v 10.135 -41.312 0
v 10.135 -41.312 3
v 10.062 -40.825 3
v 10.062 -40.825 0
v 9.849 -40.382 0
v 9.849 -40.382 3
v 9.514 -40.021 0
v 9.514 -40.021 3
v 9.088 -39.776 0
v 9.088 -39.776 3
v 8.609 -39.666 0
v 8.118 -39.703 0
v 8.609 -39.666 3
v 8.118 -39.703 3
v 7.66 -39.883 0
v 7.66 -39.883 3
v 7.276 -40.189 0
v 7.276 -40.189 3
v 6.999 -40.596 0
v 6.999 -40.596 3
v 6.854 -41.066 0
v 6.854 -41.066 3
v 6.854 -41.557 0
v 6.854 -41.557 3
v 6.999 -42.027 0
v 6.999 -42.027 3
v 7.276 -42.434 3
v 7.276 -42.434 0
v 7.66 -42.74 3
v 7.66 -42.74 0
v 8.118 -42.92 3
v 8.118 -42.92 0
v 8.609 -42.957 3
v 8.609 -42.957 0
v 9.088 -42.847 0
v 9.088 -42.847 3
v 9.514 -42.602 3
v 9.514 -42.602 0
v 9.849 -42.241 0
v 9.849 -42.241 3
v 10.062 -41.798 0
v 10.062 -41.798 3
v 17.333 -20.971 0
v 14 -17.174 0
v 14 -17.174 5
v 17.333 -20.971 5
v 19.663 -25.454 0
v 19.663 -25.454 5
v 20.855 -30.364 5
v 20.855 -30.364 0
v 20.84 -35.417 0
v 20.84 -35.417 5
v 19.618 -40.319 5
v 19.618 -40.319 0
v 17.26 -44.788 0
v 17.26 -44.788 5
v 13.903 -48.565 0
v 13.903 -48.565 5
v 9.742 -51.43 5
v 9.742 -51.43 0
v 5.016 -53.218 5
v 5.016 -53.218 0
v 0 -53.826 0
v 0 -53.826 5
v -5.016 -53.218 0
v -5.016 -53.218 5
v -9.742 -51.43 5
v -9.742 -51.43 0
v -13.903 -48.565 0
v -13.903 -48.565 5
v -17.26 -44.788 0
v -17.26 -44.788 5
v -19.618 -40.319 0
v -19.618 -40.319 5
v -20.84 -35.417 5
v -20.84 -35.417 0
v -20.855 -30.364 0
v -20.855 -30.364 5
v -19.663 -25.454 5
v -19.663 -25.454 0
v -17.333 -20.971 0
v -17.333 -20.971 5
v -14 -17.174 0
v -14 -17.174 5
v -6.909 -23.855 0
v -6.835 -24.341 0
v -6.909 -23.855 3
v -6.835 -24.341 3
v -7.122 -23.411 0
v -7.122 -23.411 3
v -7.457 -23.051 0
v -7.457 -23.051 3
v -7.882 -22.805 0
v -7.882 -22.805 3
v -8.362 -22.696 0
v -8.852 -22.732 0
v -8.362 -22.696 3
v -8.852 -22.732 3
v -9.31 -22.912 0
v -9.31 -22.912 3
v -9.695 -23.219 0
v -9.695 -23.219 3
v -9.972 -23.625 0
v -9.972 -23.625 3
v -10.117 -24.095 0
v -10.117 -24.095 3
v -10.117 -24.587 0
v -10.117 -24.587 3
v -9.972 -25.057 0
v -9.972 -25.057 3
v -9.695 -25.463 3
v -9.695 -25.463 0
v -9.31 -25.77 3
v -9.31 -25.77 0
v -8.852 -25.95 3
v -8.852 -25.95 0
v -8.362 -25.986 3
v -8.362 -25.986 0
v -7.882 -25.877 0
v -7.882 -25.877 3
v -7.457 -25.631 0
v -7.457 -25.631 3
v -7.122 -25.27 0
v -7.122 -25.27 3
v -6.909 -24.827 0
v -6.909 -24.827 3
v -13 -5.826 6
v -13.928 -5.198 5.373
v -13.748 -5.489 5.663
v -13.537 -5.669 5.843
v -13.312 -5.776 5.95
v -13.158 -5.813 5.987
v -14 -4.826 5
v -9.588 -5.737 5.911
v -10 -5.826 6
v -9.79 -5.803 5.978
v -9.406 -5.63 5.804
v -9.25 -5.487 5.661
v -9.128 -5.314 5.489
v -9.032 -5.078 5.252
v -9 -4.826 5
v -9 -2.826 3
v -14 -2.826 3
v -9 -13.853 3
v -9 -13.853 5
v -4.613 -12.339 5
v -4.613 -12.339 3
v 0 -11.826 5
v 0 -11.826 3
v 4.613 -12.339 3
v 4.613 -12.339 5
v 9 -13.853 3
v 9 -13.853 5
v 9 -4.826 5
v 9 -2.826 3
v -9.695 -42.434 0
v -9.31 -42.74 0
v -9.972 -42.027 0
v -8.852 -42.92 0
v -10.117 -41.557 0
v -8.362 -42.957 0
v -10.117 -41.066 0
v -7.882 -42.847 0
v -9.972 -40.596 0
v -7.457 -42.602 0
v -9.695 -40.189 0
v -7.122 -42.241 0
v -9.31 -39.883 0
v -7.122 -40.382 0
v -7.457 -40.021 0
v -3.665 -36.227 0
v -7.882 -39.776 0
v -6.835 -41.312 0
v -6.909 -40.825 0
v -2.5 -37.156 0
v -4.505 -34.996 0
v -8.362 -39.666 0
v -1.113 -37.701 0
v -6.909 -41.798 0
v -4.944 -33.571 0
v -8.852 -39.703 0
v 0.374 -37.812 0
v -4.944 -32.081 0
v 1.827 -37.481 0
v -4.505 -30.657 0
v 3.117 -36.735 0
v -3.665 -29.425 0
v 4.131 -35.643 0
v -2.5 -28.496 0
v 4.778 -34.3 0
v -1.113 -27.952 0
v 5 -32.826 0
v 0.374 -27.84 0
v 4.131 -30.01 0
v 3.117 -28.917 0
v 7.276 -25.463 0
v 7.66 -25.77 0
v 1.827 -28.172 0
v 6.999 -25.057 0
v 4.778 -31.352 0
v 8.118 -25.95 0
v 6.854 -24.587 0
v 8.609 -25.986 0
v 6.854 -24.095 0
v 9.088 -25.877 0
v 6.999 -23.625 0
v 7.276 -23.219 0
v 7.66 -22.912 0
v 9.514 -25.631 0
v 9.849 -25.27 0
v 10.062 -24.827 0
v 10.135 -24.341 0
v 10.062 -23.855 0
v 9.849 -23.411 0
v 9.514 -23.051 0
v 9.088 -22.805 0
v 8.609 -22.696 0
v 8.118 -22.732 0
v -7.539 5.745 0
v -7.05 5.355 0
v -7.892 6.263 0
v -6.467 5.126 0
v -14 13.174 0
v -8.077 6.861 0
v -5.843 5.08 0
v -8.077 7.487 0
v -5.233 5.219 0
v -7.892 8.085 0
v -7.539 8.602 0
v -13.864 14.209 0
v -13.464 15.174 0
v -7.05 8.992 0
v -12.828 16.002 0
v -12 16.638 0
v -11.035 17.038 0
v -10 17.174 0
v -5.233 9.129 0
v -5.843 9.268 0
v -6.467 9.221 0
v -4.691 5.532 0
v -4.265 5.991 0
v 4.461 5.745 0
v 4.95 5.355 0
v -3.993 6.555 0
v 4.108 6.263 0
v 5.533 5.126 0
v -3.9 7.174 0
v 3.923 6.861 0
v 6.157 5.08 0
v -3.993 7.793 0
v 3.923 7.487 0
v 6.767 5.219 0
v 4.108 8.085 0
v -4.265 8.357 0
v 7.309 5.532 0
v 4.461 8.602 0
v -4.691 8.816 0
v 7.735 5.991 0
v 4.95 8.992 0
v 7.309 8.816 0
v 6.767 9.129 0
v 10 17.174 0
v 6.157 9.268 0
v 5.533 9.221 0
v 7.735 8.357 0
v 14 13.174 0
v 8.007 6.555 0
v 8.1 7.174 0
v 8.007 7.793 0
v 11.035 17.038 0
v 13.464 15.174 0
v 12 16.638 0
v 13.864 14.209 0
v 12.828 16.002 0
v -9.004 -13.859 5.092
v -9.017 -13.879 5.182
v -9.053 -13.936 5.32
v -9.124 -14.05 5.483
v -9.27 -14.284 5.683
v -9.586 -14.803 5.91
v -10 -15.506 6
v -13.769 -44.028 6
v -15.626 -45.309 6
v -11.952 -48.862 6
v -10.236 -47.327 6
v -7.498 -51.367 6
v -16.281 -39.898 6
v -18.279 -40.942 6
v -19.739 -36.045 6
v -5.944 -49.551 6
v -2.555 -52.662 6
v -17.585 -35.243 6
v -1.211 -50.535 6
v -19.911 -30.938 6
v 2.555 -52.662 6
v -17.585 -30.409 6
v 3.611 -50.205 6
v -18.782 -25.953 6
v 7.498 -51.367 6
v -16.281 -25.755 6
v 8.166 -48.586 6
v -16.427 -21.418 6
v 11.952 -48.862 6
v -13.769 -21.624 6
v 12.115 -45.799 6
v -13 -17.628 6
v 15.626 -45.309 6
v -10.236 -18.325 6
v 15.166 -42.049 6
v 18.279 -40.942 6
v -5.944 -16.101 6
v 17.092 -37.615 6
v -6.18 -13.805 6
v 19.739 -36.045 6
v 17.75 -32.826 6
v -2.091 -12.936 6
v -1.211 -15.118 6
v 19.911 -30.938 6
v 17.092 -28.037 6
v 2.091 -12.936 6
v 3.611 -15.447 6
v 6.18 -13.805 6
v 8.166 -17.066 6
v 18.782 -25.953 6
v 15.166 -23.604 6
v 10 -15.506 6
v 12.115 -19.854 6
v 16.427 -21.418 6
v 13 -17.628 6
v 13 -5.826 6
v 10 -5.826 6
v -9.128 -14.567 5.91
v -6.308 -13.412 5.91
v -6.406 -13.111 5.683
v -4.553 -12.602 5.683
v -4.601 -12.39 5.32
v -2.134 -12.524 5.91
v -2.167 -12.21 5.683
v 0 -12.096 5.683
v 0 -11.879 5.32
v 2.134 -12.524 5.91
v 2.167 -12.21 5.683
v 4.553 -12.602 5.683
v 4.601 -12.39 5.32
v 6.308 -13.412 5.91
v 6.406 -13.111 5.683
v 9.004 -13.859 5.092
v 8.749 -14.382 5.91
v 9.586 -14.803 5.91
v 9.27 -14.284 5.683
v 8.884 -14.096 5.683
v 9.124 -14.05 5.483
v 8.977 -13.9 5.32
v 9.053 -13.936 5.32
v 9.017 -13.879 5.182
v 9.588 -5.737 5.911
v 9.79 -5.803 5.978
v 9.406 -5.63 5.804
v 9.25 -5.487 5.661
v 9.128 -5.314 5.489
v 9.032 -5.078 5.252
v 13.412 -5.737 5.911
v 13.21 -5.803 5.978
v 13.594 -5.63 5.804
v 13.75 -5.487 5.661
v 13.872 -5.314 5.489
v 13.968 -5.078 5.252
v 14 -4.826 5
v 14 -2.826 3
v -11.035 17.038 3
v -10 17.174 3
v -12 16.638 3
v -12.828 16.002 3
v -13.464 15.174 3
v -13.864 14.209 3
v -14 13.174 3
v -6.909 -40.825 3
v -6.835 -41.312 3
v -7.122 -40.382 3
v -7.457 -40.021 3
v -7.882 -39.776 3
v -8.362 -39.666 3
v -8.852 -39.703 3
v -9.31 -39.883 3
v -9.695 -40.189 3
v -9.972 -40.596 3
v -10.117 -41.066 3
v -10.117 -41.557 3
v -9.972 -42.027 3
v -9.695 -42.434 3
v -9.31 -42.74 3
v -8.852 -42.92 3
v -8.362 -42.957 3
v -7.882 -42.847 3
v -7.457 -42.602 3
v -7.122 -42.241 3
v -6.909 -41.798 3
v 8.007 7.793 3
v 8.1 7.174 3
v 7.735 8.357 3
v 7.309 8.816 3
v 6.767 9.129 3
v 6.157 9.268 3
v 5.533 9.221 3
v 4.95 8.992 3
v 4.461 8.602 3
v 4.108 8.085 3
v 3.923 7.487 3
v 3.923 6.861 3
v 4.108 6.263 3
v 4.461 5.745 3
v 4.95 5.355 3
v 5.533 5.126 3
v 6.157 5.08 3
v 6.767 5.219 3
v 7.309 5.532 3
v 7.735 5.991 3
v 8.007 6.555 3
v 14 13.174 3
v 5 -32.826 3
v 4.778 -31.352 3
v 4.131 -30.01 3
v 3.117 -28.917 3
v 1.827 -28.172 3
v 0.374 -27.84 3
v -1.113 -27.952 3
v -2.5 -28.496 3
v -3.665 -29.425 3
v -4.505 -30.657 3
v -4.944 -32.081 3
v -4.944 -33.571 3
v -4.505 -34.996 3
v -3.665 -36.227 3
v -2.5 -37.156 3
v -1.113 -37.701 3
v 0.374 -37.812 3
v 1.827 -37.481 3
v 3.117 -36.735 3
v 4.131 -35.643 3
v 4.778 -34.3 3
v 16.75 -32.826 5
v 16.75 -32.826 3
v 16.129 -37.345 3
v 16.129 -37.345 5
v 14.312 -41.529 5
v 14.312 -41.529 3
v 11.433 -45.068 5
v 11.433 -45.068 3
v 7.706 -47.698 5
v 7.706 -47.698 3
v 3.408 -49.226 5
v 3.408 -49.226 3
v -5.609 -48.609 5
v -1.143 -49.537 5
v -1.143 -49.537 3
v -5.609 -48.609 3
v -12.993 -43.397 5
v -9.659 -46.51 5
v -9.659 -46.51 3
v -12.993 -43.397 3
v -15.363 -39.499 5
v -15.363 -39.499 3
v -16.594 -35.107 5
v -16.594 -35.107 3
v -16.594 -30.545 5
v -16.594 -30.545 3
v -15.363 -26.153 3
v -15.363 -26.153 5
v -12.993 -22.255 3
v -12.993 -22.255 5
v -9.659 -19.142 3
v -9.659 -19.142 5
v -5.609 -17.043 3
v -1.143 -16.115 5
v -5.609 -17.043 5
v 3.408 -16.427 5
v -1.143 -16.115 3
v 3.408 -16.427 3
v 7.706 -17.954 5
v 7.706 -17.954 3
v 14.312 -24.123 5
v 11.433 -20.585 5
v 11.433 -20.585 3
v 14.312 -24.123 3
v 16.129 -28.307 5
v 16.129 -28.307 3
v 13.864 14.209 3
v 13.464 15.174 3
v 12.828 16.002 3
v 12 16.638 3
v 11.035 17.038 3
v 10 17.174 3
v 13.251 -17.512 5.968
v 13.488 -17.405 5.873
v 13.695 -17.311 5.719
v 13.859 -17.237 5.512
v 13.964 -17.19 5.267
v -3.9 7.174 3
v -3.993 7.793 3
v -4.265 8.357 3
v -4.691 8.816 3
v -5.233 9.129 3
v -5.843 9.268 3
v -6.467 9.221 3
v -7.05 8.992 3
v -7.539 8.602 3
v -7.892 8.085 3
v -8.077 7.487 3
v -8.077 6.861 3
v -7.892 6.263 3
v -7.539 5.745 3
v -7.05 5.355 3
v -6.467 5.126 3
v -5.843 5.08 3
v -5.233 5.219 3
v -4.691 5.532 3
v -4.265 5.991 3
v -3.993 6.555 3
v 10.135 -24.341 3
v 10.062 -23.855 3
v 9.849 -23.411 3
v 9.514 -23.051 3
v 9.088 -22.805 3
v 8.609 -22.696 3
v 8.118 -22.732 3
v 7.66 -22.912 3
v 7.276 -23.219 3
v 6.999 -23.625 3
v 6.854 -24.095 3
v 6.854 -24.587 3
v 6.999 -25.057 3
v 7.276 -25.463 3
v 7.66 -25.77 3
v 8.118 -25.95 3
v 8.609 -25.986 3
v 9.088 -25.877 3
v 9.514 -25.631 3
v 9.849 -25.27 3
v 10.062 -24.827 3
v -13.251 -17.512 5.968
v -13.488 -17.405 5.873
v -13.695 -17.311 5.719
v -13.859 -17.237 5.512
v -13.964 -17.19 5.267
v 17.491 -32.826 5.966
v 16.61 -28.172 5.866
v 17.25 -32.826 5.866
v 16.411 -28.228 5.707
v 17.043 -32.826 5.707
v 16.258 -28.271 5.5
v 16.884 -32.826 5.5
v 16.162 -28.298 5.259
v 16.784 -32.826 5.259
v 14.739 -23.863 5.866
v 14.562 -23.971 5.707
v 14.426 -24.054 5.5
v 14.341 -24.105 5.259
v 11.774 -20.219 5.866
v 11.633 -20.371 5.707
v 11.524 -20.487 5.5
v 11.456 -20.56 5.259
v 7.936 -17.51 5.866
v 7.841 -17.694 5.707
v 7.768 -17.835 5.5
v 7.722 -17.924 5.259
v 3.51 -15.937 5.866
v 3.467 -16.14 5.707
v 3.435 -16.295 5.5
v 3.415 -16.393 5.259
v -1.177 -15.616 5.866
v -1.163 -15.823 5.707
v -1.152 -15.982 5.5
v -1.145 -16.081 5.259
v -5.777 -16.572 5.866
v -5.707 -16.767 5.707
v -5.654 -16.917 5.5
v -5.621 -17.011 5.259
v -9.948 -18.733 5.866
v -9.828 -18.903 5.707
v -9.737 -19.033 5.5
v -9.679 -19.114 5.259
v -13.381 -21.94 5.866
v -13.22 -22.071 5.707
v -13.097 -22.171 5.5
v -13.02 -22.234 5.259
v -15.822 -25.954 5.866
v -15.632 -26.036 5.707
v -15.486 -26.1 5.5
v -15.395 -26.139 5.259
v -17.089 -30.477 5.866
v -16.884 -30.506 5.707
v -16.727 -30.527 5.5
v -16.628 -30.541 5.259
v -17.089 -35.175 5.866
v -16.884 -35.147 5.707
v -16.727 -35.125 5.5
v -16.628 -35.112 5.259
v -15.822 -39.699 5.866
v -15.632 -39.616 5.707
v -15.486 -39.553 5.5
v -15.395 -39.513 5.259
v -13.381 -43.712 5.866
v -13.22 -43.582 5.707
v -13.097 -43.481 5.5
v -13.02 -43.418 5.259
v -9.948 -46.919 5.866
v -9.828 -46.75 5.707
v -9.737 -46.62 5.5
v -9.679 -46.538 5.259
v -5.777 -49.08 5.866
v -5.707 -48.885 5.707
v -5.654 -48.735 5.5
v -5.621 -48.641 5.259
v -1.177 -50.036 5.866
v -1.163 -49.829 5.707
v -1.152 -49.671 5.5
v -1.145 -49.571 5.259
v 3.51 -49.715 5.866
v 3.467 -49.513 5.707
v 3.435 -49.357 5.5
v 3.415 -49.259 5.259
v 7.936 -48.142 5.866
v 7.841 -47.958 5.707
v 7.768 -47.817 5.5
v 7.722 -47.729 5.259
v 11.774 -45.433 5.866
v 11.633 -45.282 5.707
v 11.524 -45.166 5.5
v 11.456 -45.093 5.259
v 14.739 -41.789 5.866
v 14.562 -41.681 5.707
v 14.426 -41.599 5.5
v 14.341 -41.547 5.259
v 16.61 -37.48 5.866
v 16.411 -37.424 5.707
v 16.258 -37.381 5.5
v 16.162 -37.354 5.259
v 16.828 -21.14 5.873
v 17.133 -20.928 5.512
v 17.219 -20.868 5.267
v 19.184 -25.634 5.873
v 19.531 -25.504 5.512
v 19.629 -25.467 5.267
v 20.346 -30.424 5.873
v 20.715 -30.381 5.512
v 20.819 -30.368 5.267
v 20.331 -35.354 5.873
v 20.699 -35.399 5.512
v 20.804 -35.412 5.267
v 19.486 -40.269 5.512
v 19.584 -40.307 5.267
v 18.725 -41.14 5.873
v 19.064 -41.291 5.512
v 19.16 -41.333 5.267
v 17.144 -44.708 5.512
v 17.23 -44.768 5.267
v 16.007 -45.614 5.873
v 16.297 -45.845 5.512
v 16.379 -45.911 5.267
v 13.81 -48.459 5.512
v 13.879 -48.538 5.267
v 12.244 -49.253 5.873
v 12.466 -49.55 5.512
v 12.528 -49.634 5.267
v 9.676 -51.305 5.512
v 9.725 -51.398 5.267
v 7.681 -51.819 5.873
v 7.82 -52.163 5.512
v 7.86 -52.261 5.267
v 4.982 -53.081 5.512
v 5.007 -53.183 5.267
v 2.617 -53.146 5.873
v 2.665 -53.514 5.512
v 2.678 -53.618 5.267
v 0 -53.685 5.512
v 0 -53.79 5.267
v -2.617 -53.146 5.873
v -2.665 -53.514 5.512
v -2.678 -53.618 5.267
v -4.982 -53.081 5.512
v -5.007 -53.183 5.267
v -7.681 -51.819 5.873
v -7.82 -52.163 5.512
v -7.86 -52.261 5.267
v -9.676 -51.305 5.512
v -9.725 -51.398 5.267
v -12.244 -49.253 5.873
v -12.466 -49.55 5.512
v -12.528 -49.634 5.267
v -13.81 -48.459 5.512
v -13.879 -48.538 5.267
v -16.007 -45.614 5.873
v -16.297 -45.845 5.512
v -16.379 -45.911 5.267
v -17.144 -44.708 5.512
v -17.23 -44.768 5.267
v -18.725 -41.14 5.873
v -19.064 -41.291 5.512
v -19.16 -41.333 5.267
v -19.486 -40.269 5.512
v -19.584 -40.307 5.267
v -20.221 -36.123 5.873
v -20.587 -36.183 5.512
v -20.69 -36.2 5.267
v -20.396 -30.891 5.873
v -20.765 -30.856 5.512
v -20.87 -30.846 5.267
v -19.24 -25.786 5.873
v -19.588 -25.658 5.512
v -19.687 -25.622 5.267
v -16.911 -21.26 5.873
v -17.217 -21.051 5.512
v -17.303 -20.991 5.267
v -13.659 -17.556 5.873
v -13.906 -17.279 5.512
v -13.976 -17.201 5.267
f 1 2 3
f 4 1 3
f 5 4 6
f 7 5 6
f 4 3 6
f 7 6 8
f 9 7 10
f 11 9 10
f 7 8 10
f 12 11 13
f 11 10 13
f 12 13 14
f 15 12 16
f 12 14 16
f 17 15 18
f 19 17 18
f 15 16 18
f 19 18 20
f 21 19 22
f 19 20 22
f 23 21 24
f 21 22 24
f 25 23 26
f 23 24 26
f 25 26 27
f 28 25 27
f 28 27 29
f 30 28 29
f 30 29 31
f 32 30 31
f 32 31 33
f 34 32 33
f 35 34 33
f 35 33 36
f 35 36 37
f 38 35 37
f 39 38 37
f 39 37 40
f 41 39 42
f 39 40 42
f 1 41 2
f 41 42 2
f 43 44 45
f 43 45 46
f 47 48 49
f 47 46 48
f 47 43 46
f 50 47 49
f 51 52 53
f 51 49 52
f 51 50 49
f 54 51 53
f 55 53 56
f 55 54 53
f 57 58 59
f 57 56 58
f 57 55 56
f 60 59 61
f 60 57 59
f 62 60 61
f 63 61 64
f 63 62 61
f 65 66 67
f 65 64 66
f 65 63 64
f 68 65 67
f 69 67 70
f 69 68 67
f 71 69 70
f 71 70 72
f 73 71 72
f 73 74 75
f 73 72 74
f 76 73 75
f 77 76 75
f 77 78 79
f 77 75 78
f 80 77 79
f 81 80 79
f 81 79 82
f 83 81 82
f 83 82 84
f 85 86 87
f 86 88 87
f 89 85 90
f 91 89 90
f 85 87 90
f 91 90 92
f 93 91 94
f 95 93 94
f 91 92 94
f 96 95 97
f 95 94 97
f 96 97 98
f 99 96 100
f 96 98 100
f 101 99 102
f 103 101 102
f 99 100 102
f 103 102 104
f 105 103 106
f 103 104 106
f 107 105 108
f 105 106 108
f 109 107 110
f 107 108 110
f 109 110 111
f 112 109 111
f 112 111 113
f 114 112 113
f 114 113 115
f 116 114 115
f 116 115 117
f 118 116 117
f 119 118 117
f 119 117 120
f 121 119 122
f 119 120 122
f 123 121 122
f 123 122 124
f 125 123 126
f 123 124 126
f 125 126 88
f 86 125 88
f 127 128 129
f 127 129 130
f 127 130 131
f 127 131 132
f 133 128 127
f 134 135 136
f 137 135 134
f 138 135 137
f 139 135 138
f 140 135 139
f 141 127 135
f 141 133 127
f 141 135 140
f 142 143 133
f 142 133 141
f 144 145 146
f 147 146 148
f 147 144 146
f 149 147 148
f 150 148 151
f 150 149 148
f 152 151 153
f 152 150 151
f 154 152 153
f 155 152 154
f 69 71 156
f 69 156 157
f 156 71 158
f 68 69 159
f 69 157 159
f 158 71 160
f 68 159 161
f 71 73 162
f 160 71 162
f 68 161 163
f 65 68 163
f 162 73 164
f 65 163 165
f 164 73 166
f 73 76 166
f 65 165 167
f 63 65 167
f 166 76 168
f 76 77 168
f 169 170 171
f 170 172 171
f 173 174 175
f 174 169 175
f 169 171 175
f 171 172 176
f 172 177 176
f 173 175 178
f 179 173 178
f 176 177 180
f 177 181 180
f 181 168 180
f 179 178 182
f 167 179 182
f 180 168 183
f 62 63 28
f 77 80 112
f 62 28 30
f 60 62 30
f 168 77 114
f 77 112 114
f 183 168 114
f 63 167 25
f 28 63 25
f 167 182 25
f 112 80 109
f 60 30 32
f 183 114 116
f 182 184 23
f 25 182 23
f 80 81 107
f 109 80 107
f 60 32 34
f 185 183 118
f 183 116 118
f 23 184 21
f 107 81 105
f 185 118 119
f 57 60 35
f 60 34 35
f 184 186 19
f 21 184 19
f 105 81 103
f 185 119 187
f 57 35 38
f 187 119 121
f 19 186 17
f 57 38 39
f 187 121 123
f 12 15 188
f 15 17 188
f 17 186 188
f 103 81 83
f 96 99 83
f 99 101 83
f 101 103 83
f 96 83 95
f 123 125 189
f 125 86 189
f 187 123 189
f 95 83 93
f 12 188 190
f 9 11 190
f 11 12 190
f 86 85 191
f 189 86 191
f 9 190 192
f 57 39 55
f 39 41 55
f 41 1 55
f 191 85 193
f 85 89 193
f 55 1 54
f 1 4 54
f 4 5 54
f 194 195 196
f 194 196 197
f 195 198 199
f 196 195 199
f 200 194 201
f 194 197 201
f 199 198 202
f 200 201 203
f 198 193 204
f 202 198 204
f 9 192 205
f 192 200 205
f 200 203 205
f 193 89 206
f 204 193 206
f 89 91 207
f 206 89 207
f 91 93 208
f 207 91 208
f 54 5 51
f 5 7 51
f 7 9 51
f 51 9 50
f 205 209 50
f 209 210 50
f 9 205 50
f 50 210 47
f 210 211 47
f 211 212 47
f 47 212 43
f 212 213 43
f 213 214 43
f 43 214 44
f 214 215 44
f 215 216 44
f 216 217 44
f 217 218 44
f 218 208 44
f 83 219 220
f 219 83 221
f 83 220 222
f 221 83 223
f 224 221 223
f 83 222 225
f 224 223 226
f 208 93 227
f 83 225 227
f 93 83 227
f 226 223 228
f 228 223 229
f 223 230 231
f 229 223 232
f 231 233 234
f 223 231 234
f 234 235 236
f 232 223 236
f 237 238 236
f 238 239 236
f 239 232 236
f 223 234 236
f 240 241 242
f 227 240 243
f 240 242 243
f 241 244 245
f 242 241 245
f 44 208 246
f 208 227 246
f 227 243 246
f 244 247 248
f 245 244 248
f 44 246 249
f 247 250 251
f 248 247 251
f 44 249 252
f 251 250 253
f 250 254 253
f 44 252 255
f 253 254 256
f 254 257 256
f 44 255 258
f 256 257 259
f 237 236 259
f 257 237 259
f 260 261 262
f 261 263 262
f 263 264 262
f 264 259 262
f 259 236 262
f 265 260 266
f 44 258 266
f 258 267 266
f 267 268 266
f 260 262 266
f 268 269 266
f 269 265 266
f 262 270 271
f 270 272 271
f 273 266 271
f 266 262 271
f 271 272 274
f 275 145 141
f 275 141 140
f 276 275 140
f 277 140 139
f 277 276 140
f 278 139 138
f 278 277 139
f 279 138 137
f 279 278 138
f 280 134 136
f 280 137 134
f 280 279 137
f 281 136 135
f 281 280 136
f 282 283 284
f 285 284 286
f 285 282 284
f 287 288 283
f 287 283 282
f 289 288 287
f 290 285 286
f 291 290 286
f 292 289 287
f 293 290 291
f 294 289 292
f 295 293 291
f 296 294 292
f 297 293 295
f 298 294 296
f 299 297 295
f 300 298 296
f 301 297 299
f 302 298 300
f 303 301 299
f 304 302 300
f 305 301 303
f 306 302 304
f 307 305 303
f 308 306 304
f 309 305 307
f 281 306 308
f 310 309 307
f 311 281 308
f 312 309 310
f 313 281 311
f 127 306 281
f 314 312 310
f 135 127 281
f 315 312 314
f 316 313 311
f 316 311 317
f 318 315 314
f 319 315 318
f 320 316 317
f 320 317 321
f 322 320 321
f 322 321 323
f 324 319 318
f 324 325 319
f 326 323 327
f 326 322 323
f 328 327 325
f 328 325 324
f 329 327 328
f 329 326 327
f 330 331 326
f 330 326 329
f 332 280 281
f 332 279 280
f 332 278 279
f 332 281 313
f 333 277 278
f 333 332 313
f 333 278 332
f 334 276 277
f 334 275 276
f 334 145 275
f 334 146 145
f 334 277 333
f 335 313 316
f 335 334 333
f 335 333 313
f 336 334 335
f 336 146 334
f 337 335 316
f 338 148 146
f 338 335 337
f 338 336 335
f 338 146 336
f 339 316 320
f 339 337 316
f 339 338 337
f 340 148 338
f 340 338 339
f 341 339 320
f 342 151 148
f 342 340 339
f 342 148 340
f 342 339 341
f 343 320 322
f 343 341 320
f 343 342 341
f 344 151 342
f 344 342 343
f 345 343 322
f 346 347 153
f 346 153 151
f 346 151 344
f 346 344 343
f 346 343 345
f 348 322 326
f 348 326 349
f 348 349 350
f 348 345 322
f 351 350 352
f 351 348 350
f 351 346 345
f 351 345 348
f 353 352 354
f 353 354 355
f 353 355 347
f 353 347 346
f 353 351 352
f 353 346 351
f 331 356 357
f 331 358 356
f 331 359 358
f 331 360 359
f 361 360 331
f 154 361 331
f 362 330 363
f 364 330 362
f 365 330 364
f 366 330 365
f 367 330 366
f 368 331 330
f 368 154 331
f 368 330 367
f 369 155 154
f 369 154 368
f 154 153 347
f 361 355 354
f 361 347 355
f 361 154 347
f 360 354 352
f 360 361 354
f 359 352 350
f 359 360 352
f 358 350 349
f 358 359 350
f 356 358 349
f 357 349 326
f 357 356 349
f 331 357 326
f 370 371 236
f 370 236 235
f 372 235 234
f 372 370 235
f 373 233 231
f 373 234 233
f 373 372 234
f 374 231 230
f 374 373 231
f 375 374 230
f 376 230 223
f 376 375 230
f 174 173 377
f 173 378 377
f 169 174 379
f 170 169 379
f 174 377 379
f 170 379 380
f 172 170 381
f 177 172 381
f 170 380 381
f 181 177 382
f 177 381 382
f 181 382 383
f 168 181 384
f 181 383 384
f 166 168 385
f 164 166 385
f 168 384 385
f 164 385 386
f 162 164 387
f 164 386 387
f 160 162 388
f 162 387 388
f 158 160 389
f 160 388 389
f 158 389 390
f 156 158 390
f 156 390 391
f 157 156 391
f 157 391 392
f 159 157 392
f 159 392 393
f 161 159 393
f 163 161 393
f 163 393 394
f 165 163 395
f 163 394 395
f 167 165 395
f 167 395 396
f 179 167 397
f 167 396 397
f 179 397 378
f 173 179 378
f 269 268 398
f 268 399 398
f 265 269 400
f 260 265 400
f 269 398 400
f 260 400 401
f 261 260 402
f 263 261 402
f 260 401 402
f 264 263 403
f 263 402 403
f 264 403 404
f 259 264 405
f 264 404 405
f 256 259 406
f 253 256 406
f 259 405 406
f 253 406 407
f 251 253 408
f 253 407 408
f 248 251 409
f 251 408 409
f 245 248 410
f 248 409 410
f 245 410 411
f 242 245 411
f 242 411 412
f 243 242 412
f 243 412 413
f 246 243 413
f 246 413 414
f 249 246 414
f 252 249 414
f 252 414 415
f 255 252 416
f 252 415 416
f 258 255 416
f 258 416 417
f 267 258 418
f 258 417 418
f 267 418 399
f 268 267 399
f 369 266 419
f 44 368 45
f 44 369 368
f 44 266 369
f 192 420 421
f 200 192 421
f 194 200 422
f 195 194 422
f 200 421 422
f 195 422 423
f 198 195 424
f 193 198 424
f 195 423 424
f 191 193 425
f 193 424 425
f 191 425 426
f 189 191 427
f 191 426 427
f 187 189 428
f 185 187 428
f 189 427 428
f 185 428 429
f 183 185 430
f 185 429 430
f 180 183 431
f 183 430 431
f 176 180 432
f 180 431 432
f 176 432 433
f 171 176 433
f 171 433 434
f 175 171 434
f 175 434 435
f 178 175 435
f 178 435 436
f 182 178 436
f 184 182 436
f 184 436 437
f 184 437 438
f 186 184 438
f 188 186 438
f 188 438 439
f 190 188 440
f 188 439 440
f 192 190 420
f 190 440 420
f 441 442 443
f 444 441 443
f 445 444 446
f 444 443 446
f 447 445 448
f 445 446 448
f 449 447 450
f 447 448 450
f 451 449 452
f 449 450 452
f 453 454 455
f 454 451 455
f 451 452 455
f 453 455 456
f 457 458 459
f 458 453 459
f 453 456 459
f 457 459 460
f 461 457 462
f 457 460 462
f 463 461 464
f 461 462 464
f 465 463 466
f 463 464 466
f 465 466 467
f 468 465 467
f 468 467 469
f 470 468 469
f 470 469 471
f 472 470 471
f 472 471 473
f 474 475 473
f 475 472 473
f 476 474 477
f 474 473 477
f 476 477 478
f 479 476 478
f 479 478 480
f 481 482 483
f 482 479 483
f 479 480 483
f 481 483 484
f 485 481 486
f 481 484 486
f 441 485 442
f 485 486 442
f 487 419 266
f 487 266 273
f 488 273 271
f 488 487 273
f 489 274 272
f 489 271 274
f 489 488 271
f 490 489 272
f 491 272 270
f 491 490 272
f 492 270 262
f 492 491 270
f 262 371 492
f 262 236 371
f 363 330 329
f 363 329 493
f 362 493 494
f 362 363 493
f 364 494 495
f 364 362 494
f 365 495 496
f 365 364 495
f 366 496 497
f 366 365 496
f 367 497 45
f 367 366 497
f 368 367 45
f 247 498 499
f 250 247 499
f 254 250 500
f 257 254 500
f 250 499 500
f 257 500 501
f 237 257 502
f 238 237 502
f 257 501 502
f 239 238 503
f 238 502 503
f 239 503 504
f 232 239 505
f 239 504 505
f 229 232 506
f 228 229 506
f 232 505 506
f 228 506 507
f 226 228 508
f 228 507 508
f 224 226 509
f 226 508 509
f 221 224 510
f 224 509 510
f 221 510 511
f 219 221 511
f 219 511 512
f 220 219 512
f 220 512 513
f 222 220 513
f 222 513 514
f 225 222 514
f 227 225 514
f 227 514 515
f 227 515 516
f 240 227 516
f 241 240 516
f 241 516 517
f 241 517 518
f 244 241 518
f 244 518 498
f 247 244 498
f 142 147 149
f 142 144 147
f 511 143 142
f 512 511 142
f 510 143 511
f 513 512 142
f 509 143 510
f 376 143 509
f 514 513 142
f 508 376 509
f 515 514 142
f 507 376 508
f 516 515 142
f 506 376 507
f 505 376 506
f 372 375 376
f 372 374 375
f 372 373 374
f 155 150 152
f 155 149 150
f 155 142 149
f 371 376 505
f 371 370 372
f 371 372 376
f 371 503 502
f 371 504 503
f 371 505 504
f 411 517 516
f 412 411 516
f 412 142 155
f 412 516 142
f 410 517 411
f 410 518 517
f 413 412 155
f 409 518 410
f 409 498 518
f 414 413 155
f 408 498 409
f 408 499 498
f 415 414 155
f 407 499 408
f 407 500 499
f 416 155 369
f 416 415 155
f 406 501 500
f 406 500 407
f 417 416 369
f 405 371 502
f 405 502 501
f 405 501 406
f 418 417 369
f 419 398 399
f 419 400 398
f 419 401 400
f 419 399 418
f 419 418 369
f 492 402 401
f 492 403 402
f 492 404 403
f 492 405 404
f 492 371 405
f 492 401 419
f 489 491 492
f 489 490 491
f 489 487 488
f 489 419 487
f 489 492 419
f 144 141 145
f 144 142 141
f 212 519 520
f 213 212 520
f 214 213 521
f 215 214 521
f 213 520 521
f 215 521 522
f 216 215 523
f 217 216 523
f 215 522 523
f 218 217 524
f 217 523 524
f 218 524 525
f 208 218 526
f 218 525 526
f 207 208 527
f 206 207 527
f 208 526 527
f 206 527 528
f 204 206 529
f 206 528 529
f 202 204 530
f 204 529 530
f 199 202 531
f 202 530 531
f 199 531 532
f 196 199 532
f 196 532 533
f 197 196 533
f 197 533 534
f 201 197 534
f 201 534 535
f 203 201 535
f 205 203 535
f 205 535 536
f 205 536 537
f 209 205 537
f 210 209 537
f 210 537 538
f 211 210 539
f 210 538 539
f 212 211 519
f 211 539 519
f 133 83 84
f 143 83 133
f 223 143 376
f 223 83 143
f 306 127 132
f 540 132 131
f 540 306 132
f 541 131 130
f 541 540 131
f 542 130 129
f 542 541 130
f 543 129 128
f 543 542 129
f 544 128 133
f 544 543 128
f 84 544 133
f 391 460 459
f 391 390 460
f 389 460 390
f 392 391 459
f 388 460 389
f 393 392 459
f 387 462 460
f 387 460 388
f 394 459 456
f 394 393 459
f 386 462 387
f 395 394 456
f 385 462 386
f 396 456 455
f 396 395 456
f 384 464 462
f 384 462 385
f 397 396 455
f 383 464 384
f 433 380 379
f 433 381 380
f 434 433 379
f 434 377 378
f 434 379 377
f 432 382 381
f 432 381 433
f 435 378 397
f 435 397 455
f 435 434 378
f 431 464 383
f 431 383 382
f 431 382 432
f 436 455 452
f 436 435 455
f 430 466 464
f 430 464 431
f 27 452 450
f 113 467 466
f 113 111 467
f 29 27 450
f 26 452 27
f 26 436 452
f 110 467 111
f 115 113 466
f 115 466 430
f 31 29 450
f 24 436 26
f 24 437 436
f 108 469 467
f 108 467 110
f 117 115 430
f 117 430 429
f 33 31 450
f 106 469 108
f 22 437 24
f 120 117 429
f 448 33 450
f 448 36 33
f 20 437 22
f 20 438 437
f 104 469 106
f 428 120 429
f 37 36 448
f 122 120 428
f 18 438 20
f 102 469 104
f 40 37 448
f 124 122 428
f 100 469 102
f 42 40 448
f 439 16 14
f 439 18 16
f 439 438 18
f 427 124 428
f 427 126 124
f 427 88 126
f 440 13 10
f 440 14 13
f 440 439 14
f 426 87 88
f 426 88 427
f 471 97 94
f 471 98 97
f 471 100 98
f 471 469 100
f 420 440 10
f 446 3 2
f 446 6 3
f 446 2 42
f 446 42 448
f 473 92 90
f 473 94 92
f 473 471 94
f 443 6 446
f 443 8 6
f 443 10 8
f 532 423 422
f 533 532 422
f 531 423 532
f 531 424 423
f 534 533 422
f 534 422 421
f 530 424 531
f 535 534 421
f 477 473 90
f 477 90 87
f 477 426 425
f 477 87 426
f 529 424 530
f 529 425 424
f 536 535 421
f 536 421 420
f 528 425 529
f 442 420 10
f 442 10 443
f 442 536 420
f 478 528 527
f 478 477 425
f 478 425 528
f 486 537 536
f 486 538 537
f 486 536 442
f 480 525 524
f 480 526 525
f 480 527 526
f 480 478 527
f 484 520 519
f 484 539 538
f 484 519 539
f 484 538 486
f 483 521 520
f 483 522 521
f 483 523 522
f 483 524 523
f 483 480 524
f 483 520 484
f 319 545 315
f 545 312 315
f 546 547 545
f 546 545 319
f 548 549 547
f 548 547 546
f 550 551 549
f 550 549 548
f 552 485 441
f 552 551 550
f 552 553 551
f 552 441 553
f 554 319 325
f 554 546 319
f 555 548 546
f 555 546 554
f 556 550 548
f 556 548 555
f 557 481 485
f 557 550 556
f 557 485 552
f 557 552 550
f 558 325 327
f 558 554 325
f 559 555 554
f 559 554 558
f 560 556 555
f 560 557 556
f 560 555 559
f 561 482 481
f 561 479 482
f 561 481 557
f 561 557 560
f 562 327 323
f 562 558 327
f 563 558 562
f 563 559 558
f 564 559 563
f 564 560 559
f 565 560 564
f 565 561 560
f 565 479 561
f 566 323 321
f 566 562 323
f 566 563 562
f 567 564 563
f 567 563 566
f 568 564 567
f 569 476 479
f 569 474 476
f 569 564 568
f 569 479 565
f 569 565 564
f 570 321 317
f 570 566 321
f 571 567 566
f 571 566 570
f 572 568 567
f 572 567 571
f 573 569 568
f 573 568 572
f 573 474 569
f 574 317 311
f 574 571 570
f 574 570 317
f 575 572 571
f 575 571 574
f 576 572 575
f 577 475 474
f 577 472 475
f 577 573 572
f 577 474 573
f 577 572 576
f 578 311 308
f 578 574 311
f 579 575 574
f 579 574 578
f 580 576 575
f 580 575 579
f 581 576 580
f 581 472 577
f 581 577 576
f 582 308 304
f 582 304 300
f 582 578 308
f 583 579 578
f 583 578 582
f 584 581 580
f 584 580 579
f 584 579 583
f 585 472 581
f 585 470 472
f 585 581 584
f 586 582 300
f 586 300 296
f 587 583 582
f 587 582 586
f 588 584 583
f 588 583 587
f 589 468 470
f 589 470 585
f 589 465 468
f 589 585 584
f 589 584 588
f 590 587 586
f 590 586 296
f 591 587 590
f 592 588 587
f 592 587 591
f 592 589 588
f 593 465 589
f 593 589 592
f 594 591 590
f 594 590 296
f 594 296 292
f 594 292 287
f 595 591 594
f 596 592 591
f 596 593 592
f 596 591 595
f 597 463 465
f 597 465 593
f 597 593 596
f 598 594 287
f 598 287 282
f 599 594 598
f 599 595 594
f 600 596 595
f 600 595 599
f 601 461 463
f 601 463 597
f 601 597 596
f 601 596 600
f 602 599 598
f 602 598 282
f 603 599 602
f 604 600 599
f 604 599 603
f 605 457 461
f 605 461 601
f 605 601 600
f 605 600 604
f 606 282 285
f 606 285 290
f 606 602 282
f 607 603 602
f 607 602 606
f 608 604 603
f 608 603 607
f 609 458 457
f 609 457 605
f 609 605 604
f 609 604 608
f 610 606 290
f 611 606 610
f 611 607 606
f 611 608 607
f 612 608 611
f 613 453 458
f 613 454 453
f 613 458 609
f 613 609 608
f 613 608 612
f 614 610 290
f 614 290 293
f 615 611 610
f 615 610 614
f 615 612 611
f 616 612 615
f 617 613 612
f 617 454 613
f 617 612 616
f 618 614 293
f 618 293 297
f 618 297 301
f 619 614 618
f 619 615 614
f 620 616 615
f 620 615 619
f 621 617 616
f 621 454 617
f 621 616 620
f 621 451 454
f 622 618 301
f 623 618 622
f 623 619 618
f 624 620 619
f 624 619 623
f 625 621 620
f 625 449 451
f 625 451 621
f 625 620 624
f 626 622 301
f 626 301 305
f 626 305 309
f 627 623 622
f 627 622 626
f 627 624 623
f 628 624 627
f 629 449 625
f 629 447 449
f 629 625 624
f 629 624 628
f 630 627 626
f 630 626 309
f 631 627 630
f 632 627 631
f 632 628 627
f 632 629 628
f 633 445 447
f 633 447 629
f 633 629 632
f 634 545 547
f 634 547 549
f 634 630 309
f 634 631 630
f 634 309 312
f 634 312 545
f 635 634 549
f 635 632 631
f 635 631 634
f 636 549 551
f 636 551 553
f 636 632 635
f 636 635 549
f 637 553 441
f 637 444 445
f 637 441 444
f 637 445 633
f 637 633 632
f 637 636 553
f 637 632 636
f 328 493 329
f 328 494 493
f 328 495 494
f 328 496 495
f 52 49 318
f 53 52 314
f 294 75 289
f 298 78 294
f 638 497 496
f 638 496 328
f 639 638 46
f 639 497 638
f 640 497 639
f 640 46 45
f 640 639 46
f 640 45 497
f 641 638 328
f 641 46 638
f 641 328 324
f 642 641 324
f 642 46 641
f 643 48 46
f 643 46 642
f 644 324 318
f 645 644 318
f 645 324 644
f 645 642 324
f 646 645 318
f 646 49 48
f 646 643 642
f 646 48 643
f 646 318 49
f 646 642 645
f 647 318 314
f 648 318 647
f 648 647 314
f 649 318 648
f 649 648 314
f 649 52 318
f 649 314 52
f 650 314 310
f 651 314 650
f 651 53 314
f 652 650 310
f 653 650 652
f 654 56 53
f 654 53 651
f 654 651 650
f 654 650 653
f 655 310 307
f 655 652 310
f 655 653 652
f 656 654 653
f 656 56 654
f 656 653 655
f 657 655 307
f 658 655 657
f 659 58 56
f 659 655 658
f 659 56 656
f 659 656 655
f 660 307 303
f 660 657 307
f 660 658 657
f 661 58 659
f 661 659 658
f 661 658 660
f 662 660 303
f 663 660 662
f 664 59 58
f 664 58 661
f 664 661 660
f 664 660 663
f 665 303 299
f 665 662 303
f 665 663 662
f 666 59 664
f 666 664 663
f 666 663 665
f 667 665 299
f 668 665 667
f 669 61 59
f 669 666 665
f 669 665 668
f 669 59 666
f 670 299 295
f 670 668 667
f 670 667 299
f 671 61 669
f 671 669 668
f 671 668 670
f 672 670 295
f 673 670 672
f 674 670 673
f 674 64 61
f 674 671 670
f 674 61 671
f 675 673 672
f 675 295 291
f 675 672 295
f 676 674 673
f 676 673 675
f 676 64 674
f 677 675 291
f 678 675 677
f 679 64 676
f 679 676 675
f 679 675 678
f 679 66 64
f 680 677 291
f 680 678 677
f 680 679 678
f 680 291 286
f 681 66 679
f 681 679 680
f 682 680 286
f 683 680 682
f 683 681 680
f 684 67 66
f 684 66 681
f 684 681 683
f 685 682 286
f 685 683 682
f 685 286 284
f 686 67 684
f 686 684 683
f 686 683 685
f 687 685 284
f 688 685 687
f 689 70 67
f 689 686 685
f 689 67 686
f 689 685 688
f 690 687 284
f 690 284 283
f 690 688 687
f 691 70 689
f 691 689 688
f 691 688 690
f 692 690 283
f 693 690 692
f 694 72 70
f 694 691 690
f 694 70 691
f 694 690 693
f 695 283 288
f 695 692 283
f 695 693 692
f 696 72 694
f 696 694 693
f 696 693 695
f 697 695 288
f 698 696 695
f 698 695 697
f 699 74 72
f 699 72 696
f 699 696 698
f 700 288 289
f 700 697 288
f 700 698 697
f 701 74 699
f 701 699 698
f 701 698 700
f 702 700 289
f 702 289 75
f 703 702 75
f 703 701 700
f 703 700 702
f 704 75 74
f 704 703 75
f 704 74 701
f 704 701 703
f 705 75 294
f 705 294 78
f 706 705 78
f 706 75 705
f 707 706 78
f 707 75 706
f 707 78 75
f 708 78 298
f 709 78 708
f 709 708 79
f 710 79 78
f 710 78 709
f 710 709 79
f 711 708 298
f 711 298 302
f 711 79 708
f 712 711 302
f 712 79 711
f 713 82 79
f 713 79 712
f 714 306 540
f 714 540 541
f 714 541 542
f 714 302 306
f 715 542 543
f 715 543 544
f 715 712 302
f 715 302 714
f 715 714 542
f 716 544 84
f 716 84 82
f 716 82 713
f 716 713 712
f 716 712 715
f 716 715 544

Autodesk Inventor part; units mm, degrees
ref_plane "YZ Plane" through (0, 0, 0) normal (1, 0, 0) x (0, 1, 0)
ref_plane "XZ Plane" through (0, 0, 0) normal (0, 1, 0) x (-1, 0, 0)
ref_plane "XY Plane" through (0, 0, 0) normal (0, 0, 1) x (1, 0, 0)
sketch "Sketch1" plane through (0, 0, 0) normal (0, 0, 1) x (1, 0, 0)
  line L0 (-14, 17.1738) -> (14, 17.1738)
  line L1 (14, 17.1738) -> (14, -17.1738)
  line L2 (14, -32.8262) -> (-14, -32.8262)
  line L3 (-14, -32.8262) -> (-14, -17.1738)
  arc A0 (-14, -17.1738) -> (14, -17.1738) centre (0, -32.8262) ccw
  line L4 (-14, -17.1738) -> (-14, 17.1738)
  line L5 (14, -17.1738) -> (14, -32.8262)
  point P0 (0, 0)
  point P1 (0, 17.1738)
  point P2 (14, 0)
  dimension "d0" = 42
  dimension "d1" = 50
  dimension "d4" = 28
extrude "Extrusion1" add sketch "Sketch1" along normal blind 3
sketch "Sketch2" plane through (0, 0, 3) normal (0, 0, 1) x (1, 0, 0)
  line L0 (14, -17.1738) -> (14, 17.1738) projected
  line L1 (14, 17.1738) -> (-14, 17.1738) construction
  line L2 (-14, 17.1738) -> (-14, -17.1738) construction
  arc A0 (-14, -17.1738) -> (14, -17.1738) centre (0, -32.8262) ccw projected
  circle A1 centre (0, -32.8262) radius 16.75
  circle A2 centre (0, -32.8262) radius 21
  line L3 (-14, -2.8262) -> (14, -2.8262)
  line L4 (14, -17.1738) -> (14, 17.1738) construction
  line L5 (-14, 17.1738) -> (-14, -17.1738) projected
  line L6 (-14, -2.8262) -> (-14, -17.1738)
  line L7 (-9, -2.8262) -> (-9, -13.8526)
  line L8 (14, -2.8262) -> (14, -17.1738)
  line L9 (9, -13.8526) -> (9, -2.8262)
  arc A3 (-14, -17.1738) -> (14, -17.1738) centre (0, -32.8262) ccw projected
  line L10 (14, -2.8262) -> (14, -17.1738)
  point P0 (0, 0)
  dimension "d5" = 33.5
  dimension "d6" = 20
  dimension "d7" = 5
  dimension "d8" = 5
extrude "Extrusion2" add sketch "Sketch2" along normal blind 3 contours A2 L9 L3 L0 | A0 A2 | L5 L3 L7 A2
sketch "Sketch3" plane through (0, 0, 3) normal (0, 0, 1) x (1, 0, 0)
  circle A0 centre (0, -32.8262) radius 16.75 projected
  circle A1 centre (0, -32.8262) radius 5
  line L0 (9, -2.8262) -> (14, -2.8262) projected
  line L1 (14, -2.8262) -> (14, 17.1738) projected
  line L2 (14, 17.1738) -> (-14, 17.1738) projected
  line L3 (-14, 17.1738) -> (-14, -2.8262) projected
  line L4 (-14, -2.8262) -> (-9, -2.8262) projected
  line L5 (-9, -2.8262) -> (-9, -13.8526) projected
  arc A2 (9, -13.8526) -> (-9, -13.8526) centre (0, -32.8262) ccw projected
  line L6 (9, -13.8526) -> (9, -2.8262) projected
  circle A3 centre (-6, 7.1738) radius 2.1
  circle A4 centre (6, 7.1738) radius 2.1
  line L7 (-6, 7.1738) -> (6, 7.1738) construction
  point P0 (0, 0)
  point P1 (0, 7.1738)
  dimension "d11" = 10
  dimension "d12" = 4.2
  dimension "d13" = 12
  dimension "d14" = 10
extrude "Extrusion3" cut sketch "Sketch3" against normal up to next contours A1 | A3 | A4
chamfer "Chamfer1" distance 3 angle 45 2 edges at (11.5, -2.8262, 6) (-11.5, -2.8262, 6)
fillet "Fillet1" radius 1 7 edges at (-16.75, -32.8262, 6) (0, -11.8262, 6) (0, -53.8262, 6) (-14, -11.4998, 6) (-9, -9.8392, 6) (9, -9.8392, 6) (14, -11.4998, 6)
sketch "Sketch4" plane through (0, -32.8262, 3) normal (0, 0, 1) x (1, 0, 0)
  circle A0 centre (0, 0) radius 5 projected
  circle A1 centre (8.4853, 8.4853) radius 1.65
  line L0 (0, 0) -> (8.4853, 8.4853) construction
  line L1 (0, 0) -> (0, 12.1192) construction
  line L2 (0, 0) -> (-12.1192, 0) construction
  circle A2 centre (-8.4853, 8.4853) radius 1.65
  line L3 (0, 0) -> (0, -12.1192) construction
  circle A3 centre (-8.4853, -8.4853) radius 1.65
  line L4 (0, 0) -> (12.1192, 0) construction
  circle A4 centre (8.4853, -8.4853) radius 1.65
  point P0 (0, 32.8262)
  dimension "d21" = 45
  dimension "d22" = 3.3
  dimension "d23" = 12
  dimension "d26" = 360
extrude "Extrusion4" cut sketch "Sketch4" against normal up to next contours A1 | A2 | A3 | A4
fillet "Fillet2" radius 4 2 edges at (-14, 17.1738, 1.5) (14, 17.1738, 1.5)
equation "\"d8\" = d7"
properties part number "holder-LMF8LUU-z-axis"
